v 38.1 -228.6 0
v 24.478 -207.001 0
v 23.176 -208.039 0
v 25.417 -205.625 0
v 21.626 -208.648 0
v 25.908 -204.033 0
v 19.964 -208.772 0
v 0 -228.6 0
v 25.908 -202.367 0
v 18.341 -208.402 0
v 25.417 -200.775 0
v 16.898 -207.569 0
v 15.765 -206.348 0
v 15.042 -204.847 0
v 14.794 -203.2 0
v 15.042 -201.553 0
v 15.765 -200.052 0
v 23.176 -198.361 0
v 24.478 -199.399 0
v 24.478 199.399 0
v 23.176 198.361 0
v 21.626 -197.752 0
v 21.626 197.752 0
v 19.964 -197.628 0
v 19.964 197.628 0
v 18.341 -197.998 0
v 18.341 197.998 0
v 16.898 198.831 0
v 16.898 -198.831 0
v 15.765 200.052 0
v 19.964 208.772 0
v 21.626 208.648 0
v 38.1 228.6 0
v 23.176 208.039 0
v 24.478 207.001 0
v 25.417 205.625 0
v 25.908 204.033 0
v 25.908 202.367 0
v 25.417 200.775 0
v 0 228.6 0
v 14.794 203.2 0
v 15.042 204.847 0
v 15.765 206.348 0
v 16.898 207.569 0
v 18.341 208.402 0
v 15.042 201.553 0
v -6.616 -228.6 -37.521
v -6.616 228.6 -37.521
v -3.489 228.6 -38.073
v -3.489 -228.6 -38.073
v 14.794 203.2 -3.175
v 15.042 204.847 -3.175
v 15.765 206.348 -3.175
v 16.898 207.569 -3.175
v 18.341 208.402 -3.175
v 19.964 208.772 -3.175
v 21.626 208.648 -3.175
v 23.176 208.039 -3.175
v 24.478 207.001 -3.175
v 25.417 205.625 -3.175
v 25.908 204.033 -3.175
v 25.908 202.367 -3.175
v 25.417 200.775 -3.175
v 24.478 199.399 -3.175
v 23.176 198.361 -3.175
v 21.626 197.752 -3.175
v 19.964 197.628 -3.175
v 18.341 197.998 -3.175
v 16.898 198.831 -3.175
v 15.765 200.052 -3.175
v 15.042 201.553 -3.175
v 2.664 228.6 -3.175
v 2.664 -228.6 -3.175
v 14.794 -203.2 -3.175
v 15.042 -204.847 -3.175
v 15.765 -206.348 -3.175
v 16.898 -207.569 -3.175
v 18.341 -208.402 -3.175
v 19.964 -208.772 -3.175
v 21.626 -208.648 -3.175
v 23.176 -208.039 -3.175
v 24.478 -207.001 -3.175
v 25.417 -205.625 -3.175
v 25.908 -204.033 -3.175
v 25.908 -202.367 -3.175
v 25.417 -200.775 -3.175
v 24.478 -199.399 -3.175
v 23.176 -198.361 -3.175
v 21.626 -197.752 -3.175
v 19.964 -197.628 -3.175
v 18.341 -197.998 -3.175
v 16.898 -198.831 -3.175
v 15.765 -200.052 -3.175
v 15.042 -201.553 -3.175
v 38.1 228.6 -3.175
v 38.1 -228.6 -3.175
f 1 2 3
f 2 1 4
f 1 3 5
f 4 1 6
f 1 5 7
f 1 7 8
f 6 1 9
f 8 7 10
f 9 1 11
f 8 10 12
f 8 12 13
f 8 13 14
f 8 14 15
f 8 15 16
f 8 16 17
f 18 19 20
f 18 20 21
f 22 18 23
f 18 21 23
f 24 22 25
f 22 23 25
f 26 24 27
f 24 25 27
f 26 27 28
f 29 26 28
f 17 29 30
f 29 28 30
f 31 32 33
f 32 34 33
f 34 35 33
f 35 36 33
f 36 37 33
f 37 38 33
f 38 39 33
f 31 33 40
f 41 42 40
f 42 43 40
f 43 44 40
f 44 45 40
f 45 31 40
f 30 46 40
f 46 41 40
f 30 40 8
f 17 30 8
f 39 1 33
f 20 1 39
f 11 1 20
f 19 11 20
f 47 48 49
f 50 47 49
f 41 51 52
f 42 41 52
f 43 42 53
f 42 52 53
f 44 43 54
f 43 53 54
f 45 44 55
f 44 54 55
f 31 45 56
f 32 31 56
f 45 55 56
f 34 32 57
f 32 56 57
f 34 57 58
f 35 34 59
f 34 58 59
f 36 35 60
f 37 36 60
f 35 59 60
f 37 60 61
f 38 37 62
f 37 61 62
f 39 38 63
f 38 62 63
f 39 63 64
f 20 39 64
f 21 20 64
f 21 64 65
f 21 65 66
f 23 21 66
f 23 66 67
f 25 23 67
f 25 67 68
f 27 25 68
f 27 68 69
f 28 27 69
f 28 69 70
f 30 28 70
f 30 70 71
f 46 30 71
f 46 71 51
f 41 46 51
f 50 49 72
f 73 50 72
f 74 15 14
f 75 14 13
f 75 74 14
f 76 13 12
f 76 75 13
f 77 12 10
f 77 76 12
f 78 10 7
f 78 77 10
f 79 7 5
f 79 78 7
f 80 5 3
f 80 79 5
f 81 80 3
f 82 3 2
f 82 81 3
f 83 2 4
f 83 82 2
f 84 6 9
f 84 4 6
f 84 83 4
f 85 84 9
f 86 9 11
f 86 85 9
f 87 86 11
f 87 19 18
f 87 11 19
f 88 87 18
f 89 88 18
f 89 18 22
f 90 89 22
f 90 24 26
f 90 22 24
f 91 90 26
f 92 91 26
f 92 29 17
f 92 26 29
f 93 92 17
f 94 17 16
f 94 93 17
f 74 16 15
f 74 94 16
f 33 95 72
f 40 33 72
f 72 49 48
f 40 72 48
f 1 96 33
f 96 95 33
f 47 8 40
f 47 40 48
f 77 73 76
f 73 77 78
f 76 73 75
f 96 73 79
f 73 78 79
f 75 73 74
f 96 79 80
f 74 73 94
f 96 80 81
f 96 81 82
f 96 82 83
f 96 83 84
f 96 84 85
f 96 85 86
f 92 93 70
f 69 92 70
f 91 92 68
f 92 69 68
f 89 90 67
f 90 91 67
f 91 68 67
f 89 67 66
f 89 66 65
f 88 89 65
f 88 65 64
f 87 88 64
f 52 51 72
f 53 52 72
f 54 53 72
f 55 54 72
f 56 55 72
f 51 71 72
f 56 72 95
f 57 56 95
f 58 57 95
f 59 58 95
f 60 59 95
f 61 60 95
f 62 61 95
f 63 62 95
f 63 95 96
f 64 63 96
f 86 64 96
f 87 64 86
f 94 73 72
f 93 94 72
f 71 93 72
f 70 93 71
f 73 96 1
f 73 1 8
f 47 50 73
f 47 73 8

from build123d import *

# Parameters (mm, degrees)
BOSS_EXTRUDE1_DEPTH = 228.6
SKETCH19_R          = 5.588
CUT_EXTRUDE2_DEPTH  = 235.36596615


with BuildPart() as part:
    # Sketch18 → Boss-Extrude1 (new, symmetric)
    with BuildSketch(Plane(origin=(0, 0, 0), x_dir=(1, 0, 0), z_dir=(0, 1, 0))):
        Polygon((-3.489230953, 38.072508354), (2.664141329, 3.175), (38.1, 3.175), (38.1, 0), (0, 0), (-6.615995569, 37.52117539), align=None)
    extrude(amount=BOSS_EXTRUDE1_DEPTH, both=True)

    # Sketch19 → Cut-Extrude2 (cut, through all)
    with BuildSketch(Plane(origin=(0, 0, -3.175), x_dir=(-1, 0, 0), z_dir=(0, 0, -1))):
        with Locations((-20.382070664, 203.2)):
            Circle(SKETCH19_R)
    cut_extrude2 = extrude(amount=-CUT_EXTRUDE2_DEPTH, mode=Mode.SUBTRACT)

    # Mirror1: Cut-Extrude2 across plane
    add(cut_extrude2.mirror(Plane.ZX), mode=Mode.SUBTRACT)


solid = part.part
